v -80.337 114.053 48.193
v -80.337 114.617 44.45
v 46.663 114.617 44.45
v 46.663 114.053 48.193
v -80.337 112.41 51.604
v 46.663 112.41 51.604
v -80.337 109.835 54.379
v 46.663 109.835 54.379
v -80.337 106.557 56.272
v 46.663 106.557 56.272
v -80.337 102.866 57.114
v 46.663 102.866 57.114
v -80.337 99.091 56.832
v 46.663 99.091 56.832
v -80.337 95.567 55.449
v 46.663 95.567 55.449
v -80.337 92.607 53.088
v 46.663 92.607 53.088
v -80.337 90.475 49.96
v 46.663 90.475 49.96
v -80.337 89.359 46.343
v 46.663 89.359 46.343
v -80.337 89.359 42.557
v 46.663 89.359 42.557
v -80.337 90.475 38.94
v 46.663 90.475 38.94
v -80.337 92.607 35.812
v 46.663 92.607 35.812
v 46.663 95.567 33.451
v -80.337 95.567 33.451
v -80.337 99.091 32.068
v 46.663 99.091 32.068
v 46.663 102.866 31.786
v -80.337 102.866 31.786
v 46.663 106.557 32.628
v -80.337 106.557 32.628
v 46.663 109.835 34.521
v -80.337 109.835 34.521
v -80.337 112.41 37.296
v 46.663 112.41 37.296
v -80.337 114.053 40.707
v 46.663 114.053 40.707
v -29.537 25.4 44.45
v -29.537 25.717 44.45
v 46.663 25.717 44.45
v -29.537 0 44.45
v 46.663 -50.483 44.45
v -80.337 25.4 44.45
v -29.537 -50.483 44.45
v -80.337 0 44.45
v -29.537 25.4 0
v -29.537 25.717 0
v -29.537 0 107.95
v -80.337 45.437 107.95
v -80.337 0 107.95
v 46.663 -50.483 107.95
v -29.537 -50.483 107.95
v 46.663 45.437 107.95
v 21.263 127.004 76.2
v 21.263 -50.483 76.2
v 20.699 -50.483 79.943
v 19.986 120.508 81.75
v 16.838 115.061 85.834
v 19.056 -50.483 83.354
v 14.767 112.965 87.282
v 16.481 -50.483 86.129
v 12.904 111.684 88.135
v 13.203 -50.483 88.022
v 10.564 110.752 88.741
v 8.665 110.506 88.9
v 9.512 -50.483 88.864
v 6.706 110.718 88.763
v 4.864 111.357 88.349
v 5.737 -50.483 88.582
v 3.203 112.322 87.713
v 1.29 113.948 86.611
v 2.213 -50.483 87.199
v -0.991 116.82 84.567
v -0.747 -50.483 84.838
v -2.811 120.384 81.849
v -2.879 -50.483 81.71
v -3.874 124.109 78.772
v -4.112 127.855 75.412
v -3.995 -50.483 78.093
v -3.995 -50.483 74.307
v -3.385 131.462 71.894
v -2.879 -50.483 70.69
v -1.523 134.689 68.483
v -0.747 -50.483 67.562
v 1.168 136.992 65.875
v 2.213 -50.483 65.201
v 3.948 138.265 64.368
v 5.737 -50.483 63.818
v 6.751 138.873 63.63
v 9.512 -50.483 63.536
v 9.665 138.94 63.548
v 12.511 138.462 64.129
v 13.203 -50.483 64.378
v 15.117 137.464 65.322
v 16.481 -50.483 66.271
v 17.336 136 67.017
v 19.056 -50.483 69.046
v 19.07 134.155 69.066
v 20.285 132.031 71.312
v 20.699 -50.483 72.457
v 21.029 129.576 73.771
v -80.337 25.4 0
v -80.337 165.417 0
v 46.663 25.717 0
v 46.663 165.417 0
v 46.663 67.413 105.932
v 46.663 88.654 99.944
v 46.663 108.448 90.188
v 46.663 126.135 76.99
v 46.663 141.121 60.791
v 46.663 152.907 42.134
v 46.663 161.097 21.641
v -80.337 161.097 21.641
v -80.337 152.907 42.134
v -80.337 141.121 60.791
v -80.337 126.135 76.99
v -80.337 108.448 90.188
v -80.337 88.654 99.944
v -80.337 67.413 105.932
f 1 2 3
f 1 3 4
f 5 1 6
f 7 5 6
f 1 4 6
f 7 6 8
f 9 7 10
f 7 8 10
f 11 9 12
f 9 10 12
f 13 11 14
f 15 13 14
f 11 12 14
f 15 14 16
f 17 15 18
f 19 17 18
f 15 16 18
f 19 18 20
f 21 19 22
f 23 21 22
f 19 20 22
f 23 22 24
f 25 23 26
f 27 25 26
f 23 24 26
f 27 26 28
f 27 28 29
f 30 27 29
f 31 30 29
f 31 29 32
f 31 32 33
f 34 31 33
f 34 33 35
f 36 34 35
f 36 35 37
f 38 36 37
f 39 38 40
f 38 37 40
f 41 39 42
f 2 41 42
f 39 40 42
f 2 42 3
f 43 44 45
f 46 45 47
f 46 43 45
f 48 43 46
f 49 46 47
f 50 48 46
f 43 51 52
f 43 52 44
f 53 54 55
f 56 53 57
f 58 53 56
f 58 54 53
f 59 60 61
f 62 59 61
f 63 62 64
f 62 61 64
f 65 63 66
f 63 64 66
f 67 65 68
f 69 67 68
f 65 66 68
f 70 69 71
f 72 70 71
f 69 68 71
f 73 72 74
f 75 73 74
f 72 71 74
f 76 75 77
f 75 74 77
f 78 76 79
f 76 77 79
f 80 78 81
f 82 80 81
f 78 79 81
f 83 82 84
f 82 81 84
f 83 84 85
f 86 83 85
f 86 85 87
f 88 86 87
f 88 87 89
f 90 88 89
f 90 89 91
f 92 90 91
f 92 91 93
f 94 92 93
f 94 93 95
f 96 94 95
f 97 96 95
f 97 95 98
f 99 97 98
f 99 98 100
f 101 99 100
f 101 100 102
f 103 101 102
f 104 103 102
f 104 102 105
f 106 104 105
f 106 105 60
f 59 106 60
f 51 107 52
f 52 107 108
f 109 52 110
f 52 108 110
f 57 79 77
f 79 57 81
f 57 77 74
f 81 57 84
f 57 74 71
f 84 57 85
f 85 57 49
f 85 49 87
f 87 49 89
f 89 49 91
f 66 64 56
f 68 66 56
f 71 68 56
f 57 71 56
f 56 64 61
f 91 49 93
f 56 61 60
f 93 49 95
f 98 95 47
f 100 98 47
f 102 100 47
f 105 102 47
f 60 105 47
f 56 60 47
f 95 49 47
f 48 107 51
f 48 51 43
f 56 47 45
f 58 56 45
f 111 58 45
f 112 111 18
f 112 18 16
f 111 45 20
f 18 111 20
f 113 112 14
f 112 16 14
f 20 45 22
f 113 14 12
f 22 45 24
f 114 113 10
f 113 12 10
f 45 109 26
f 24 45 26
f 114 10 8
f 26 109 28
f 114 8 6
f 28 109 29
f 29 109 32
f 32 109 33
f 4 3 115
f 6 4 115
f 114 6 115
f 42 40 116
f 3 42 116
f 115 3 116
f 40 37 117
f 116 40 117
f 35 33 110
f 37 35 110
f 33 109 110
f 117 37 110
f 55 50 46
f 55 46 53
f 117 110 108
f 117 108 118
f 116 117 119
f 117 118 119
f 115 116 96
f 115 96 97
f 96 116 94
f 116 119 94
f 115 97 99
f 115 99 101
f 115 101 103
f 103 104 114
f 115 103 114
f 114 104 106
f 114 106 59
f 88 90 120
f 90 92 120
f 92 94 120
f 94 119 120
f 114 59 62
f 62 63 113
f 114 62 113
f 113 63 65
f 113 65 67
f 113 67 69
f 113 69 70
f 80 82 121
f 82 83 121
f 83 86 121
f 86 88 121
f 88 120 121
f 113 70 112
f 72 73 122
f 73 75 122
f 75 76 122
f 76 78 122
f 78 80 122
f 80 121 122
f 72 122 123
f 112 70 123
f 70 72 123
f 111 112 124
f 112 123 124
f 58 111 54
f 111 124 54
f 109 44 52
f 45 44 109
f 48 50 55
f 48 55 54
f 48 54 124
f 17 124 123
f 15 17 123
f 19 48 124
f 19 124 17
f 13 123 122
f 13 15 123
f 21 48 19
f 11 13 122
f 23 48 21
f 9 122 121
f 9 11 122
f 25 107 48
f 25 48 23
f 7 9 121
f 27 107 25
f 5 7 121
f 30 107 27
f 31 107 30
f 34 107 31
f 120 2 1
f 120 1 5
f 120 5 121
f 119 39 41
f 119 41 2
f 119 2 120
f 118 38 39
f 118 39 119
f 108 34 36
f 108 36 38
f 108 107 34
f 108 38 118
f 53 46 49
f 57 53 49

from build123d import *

# Parameters (mm, degrees)
F0_W        = 127
F0_H        = 215.9
F1_DEPTH    = 107.95
F2_W        = 50.4830591381
F2_H        = 107.95
F3_DEPTH    = 50.8
F4_W        = 76.2
F4_H        = 44.45
F5_DEPTH    = 76.2
F8_T1_DEPTH = 726.8985851792
F6_R        = 12.7
F9_DEPTH    = 215.901
F7_R        = 12.7
F10_DEPTH   = 127
F11_W       = 25.4
F11_H       = 44.45
F12_DEPTH   = 50.8


# Not quite as in the source:
# - a fillet or chamfer that OpenCascade refuses, or shapes differently, is made with other operations: its cross-section is extruded or revolved along the edge and cut away or added


with BuildPart() as f1:
    # F0 (on Top) → F1 (new body)
    with BuildSketch(Plane.XY):
        with Locations((-16.8368311822, 57.4669408619)):
            Rectangle(F0_W, F0_H)
    extrude(amount=F1_DEPTH)

    # F2 (on face) → F3 (cut)
    with BuildSketch(Plane(origin=(-80.3368311822, 0, 0), x_dir=(0, -1, 0), z_dir=(-1, 0, 0))):
        with Locations((25.241529569, 53.975)):
            Rectangle(F2_W, F2_H)
    extrude(amount=-F3_DEPTH, mode=Mode.SUBTRACT)

    # F4 (on face) → F5 (cut)
    with BuildSketch(Plane.XZ.offset(50.4830591381)):
        with Locations((8.5631688178, 22.225)):
            Rectangle(F4_W, F4_H)
    extrude(amount=-F5_DEPTH, mode=Mode.SUBTRACT)

    # F8: fillet of radius 120.65 on 1 edges, made by hand

    # F8_s2 → F8_t1 (cut)
    with BuildSketch(Plane.YZ.offset(-380.2861237718)):
        with BuildLine():
            ThreePointArc((165.4169408619, 0), (126.1347067484, 76.9902377631), (45.4372238261, 107.95))
            Line((45.4372238261, 107.95), (165.4169408619, 107.95))
            Line((165.4169408619, 107.95), (165.4169408619, 0))
        make_face()
    extrude(amount=F8_T1_DEPTH, mode=Mode.SUBTRACT)

    # F6 (on face) → F9 (cut, through all)
    with BuildSketch(Plane.XZ.offset(50.4830591381)):
        with Locations((8.5631688178, 76.2)):
            Circle(F6_R)
    extrude(amount=-F9_DEPTH, mode=Mode.SUBTRACT)

    # F7 (on face) → F10 (cut)
    with BuildSketch(Plane.YZ.offset(46.6631688178)):
        with Locations((101.9169408619, 44.45)):
            Circle(F7_R)
    extrude(amount=-F10_DEPTH, mode=Mode.SUBTRACT)

    # F11 (on face) → F12 (cut)
    with BuildSketch(Plane(origin=(-80.3368311822, 0, 0), x_dir=(0, -1, 0), z_dir=(-1, 0, 0))):
        with Locations((-12.7, 22.225)):
            Rectangle(F11_W, F11_H)
    extrude(amount=-F12_DEPTH, mode=Mode.SUBTRACT)


solid = f1.part
